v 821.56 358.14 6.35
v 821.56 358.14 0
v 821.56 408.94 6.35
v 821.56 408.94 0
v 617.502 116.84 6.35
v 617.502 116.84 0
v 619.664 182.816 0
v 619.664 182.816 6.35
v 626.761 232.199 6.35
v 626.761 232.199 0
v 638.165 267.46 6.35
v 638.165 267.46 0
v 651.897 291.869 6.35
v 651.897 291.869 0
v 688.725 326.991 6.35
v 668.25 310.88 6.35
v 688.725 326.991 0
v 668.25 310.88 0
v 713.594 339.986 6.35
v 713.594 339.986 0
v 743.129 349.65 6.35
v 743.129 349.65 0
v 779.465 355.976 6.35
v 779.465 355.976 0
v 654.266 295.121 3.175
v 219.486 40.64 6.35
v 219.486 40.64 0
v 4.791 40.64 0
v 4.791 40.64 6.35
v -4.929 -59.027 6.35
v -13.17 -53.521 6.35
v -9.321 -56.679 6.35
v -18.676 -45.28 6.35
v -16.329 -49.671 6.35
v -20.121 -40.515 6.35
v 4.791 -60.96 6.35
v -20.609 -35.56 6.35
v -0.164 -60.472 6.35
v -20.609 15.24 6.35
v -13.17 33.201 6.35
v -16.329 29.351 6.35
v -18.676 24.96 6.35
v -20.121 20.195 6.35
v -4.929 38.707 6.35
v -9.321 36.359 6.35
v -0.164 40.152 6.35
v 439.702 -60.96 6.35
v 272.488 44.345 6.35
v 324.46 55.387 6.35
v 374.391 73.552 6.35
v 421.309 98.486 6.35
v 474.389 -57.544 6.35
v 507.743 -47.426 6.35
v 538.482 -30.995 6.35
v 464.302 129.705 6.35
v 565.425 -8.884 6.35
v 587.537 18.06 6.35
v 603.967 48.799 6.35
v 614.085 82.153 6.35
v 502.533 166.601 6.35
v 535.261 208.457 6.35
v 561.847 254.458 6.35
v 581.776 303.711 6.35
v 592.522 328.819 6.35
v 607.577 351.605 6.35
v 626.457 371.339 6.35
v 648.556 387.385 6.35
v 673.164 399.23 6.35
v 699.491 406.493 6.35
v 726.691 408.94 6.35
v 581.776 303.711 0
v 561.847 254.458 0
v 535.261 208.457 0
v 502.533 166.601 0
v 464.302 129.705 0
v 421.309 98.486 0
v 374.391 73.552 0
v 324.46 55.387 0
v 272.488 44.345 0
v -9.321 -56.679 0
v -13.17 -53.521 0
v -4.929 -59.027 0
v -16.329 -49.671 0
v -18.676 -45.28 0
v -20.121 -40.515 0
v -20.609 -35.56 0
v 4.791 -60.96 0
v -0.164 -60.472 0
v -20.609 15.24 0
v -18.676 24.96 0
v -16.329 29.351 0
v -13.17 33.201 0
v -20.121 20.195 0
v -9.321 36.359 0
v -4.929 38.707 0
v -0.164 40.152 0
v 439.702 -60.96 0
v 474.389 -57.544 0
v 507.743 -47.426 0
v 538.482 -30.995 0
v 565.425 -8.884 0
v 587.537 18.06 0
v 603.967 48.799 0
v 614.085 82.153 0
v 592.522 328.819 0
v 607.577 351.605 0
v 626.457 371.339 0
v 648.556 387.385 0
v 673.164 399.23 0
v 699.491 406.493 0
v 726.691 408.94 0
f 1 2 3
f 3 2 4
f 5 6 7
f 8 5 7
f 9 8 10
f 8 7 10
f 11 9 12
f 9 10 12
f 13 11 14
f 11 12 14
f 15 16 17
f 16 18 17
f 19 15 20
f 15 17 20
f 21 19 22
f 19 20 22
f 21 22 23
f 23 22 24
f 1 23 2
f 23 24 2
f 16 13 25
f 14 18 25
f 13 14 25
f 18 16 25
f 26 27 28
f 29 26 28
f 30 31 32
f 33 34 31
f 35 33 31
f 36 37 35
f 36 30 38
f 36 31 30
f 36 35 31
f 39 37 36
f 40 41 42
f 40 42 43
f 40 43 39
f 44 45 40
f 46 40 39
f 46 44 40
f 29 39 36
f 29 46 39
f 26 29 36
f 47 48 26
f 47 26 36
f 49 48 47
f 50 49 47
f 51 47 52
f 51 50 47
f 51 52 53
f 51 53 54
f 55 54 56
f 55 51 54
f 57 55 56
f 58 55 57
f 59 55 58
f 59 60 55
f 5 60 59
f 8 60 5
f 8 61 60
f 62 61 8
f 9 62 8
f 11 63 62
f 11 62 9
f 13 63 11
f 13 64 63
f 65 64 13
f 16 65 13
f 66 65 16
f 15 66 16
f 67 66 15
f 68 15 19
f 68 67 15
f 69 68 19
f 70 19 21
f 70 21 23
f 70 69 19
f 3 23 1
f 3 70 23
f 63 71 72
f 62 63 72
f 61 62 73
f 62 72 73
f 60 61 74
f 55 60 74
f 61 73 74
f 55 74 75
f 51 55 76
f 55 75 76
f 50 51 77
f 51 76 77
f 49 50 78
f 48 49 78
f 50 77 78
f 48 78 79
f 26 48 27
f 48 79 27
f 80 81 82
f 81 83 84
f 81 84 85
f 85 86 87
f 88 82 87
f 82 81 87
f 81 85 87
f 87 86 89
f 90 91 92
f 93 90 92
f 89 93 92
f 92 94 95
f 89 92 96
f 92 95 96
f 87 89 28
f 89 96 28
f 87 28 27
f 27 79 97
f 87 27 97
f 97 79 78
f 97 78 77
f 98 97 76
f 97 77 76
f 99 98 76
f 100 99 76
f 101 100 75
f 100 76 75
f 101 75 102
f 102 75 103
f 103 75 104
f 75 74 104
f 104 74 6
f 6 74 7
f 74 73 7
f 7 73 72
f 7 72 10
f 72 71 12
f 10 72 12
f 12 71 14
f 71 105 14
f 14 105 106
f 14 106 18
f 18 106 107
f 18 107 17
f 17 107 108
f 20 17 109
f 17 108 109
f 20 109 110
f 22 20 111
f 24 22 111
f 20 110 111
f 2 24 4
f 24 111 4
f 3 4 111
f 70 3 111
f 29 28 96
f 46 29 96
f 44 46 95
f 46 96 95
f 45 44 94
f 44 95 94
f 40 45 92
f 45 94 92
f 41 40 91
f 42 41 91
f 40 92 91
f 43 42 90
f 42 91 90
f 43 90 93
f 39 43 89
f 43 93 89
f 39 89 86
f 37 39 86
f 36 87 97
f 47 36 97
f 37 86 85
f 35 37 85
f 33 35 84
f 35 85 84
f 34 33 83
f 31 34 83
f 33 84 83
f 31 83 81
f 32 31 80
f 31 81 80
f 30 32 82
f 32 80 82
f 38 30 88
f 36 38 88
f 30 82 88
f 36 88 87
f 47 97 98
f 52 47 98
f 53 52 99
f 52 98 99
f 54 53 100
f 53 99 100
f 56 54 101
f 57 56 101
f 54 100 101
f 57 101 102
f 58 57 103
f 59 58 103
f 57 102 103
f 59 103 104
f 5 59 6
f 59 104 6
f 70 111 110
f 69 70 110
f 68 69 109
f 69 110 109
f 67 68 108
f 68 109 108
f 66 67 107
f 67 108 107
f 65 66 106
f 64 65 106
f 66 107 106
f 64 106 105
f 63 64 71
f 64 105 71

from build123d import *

# Parameters (mm, degrees)
BOSS_EXTRUDE1_DEPTH = 6.35


with BuildPart() as part:
    # Sketch1 → Boss-Extrude1 (new body)
    with BuildSketch(Plane.XY):
        with BuildLine():
            Line((4.79079833, -60.96), (439.701599067, -60.96))
            ThreePointArc((439.701599067, -60.96), (565.425184762, -8.883585695), (617.501599067, 116.84))
            add(Edge.make_bspline(
                [(617.501599067, 116.84), (617.501599067, 198.103261629), (630.412866299, 310.67677722), (736.575869498, 358.14), (821.560436263, 358.14)],
                knots=[0, 0, 0, 0, 0.504521354, 1, 1, 1, 1], degree=3))
            Line((821.560436263, 358.14), (821.560436263, 408.94))
            Line((821.560436263, 408.94), (726.691494057, 408.94))
            ThreePointArc((726.691494057, 408.94), (637.145879185, 379.858055682), (581.775600083, 303.711428571))
            ThreePointArc((581.775600083, 303.711428571), (443.349902326, 113.344860795), (219.485865145, 40.64))
            Line((219.485865145, 40.64), (4.79079833, 40.64))
            ThreePointArc((4.79079833, 40.64), (-13.169713912, 33.200512242), (-20.60920167, 15.24))
            Line((-20.60920167, 15.24), (-20.60920167, -35.56))
            ThreePointArc((-20.60920167, -35.56), (-13.169713912, -53.520512242), (4.79079833, -60.96))
        make_face()
    extrude(amount=BOSS_EXTRUDE1_DEPTH)


solid = part.part
